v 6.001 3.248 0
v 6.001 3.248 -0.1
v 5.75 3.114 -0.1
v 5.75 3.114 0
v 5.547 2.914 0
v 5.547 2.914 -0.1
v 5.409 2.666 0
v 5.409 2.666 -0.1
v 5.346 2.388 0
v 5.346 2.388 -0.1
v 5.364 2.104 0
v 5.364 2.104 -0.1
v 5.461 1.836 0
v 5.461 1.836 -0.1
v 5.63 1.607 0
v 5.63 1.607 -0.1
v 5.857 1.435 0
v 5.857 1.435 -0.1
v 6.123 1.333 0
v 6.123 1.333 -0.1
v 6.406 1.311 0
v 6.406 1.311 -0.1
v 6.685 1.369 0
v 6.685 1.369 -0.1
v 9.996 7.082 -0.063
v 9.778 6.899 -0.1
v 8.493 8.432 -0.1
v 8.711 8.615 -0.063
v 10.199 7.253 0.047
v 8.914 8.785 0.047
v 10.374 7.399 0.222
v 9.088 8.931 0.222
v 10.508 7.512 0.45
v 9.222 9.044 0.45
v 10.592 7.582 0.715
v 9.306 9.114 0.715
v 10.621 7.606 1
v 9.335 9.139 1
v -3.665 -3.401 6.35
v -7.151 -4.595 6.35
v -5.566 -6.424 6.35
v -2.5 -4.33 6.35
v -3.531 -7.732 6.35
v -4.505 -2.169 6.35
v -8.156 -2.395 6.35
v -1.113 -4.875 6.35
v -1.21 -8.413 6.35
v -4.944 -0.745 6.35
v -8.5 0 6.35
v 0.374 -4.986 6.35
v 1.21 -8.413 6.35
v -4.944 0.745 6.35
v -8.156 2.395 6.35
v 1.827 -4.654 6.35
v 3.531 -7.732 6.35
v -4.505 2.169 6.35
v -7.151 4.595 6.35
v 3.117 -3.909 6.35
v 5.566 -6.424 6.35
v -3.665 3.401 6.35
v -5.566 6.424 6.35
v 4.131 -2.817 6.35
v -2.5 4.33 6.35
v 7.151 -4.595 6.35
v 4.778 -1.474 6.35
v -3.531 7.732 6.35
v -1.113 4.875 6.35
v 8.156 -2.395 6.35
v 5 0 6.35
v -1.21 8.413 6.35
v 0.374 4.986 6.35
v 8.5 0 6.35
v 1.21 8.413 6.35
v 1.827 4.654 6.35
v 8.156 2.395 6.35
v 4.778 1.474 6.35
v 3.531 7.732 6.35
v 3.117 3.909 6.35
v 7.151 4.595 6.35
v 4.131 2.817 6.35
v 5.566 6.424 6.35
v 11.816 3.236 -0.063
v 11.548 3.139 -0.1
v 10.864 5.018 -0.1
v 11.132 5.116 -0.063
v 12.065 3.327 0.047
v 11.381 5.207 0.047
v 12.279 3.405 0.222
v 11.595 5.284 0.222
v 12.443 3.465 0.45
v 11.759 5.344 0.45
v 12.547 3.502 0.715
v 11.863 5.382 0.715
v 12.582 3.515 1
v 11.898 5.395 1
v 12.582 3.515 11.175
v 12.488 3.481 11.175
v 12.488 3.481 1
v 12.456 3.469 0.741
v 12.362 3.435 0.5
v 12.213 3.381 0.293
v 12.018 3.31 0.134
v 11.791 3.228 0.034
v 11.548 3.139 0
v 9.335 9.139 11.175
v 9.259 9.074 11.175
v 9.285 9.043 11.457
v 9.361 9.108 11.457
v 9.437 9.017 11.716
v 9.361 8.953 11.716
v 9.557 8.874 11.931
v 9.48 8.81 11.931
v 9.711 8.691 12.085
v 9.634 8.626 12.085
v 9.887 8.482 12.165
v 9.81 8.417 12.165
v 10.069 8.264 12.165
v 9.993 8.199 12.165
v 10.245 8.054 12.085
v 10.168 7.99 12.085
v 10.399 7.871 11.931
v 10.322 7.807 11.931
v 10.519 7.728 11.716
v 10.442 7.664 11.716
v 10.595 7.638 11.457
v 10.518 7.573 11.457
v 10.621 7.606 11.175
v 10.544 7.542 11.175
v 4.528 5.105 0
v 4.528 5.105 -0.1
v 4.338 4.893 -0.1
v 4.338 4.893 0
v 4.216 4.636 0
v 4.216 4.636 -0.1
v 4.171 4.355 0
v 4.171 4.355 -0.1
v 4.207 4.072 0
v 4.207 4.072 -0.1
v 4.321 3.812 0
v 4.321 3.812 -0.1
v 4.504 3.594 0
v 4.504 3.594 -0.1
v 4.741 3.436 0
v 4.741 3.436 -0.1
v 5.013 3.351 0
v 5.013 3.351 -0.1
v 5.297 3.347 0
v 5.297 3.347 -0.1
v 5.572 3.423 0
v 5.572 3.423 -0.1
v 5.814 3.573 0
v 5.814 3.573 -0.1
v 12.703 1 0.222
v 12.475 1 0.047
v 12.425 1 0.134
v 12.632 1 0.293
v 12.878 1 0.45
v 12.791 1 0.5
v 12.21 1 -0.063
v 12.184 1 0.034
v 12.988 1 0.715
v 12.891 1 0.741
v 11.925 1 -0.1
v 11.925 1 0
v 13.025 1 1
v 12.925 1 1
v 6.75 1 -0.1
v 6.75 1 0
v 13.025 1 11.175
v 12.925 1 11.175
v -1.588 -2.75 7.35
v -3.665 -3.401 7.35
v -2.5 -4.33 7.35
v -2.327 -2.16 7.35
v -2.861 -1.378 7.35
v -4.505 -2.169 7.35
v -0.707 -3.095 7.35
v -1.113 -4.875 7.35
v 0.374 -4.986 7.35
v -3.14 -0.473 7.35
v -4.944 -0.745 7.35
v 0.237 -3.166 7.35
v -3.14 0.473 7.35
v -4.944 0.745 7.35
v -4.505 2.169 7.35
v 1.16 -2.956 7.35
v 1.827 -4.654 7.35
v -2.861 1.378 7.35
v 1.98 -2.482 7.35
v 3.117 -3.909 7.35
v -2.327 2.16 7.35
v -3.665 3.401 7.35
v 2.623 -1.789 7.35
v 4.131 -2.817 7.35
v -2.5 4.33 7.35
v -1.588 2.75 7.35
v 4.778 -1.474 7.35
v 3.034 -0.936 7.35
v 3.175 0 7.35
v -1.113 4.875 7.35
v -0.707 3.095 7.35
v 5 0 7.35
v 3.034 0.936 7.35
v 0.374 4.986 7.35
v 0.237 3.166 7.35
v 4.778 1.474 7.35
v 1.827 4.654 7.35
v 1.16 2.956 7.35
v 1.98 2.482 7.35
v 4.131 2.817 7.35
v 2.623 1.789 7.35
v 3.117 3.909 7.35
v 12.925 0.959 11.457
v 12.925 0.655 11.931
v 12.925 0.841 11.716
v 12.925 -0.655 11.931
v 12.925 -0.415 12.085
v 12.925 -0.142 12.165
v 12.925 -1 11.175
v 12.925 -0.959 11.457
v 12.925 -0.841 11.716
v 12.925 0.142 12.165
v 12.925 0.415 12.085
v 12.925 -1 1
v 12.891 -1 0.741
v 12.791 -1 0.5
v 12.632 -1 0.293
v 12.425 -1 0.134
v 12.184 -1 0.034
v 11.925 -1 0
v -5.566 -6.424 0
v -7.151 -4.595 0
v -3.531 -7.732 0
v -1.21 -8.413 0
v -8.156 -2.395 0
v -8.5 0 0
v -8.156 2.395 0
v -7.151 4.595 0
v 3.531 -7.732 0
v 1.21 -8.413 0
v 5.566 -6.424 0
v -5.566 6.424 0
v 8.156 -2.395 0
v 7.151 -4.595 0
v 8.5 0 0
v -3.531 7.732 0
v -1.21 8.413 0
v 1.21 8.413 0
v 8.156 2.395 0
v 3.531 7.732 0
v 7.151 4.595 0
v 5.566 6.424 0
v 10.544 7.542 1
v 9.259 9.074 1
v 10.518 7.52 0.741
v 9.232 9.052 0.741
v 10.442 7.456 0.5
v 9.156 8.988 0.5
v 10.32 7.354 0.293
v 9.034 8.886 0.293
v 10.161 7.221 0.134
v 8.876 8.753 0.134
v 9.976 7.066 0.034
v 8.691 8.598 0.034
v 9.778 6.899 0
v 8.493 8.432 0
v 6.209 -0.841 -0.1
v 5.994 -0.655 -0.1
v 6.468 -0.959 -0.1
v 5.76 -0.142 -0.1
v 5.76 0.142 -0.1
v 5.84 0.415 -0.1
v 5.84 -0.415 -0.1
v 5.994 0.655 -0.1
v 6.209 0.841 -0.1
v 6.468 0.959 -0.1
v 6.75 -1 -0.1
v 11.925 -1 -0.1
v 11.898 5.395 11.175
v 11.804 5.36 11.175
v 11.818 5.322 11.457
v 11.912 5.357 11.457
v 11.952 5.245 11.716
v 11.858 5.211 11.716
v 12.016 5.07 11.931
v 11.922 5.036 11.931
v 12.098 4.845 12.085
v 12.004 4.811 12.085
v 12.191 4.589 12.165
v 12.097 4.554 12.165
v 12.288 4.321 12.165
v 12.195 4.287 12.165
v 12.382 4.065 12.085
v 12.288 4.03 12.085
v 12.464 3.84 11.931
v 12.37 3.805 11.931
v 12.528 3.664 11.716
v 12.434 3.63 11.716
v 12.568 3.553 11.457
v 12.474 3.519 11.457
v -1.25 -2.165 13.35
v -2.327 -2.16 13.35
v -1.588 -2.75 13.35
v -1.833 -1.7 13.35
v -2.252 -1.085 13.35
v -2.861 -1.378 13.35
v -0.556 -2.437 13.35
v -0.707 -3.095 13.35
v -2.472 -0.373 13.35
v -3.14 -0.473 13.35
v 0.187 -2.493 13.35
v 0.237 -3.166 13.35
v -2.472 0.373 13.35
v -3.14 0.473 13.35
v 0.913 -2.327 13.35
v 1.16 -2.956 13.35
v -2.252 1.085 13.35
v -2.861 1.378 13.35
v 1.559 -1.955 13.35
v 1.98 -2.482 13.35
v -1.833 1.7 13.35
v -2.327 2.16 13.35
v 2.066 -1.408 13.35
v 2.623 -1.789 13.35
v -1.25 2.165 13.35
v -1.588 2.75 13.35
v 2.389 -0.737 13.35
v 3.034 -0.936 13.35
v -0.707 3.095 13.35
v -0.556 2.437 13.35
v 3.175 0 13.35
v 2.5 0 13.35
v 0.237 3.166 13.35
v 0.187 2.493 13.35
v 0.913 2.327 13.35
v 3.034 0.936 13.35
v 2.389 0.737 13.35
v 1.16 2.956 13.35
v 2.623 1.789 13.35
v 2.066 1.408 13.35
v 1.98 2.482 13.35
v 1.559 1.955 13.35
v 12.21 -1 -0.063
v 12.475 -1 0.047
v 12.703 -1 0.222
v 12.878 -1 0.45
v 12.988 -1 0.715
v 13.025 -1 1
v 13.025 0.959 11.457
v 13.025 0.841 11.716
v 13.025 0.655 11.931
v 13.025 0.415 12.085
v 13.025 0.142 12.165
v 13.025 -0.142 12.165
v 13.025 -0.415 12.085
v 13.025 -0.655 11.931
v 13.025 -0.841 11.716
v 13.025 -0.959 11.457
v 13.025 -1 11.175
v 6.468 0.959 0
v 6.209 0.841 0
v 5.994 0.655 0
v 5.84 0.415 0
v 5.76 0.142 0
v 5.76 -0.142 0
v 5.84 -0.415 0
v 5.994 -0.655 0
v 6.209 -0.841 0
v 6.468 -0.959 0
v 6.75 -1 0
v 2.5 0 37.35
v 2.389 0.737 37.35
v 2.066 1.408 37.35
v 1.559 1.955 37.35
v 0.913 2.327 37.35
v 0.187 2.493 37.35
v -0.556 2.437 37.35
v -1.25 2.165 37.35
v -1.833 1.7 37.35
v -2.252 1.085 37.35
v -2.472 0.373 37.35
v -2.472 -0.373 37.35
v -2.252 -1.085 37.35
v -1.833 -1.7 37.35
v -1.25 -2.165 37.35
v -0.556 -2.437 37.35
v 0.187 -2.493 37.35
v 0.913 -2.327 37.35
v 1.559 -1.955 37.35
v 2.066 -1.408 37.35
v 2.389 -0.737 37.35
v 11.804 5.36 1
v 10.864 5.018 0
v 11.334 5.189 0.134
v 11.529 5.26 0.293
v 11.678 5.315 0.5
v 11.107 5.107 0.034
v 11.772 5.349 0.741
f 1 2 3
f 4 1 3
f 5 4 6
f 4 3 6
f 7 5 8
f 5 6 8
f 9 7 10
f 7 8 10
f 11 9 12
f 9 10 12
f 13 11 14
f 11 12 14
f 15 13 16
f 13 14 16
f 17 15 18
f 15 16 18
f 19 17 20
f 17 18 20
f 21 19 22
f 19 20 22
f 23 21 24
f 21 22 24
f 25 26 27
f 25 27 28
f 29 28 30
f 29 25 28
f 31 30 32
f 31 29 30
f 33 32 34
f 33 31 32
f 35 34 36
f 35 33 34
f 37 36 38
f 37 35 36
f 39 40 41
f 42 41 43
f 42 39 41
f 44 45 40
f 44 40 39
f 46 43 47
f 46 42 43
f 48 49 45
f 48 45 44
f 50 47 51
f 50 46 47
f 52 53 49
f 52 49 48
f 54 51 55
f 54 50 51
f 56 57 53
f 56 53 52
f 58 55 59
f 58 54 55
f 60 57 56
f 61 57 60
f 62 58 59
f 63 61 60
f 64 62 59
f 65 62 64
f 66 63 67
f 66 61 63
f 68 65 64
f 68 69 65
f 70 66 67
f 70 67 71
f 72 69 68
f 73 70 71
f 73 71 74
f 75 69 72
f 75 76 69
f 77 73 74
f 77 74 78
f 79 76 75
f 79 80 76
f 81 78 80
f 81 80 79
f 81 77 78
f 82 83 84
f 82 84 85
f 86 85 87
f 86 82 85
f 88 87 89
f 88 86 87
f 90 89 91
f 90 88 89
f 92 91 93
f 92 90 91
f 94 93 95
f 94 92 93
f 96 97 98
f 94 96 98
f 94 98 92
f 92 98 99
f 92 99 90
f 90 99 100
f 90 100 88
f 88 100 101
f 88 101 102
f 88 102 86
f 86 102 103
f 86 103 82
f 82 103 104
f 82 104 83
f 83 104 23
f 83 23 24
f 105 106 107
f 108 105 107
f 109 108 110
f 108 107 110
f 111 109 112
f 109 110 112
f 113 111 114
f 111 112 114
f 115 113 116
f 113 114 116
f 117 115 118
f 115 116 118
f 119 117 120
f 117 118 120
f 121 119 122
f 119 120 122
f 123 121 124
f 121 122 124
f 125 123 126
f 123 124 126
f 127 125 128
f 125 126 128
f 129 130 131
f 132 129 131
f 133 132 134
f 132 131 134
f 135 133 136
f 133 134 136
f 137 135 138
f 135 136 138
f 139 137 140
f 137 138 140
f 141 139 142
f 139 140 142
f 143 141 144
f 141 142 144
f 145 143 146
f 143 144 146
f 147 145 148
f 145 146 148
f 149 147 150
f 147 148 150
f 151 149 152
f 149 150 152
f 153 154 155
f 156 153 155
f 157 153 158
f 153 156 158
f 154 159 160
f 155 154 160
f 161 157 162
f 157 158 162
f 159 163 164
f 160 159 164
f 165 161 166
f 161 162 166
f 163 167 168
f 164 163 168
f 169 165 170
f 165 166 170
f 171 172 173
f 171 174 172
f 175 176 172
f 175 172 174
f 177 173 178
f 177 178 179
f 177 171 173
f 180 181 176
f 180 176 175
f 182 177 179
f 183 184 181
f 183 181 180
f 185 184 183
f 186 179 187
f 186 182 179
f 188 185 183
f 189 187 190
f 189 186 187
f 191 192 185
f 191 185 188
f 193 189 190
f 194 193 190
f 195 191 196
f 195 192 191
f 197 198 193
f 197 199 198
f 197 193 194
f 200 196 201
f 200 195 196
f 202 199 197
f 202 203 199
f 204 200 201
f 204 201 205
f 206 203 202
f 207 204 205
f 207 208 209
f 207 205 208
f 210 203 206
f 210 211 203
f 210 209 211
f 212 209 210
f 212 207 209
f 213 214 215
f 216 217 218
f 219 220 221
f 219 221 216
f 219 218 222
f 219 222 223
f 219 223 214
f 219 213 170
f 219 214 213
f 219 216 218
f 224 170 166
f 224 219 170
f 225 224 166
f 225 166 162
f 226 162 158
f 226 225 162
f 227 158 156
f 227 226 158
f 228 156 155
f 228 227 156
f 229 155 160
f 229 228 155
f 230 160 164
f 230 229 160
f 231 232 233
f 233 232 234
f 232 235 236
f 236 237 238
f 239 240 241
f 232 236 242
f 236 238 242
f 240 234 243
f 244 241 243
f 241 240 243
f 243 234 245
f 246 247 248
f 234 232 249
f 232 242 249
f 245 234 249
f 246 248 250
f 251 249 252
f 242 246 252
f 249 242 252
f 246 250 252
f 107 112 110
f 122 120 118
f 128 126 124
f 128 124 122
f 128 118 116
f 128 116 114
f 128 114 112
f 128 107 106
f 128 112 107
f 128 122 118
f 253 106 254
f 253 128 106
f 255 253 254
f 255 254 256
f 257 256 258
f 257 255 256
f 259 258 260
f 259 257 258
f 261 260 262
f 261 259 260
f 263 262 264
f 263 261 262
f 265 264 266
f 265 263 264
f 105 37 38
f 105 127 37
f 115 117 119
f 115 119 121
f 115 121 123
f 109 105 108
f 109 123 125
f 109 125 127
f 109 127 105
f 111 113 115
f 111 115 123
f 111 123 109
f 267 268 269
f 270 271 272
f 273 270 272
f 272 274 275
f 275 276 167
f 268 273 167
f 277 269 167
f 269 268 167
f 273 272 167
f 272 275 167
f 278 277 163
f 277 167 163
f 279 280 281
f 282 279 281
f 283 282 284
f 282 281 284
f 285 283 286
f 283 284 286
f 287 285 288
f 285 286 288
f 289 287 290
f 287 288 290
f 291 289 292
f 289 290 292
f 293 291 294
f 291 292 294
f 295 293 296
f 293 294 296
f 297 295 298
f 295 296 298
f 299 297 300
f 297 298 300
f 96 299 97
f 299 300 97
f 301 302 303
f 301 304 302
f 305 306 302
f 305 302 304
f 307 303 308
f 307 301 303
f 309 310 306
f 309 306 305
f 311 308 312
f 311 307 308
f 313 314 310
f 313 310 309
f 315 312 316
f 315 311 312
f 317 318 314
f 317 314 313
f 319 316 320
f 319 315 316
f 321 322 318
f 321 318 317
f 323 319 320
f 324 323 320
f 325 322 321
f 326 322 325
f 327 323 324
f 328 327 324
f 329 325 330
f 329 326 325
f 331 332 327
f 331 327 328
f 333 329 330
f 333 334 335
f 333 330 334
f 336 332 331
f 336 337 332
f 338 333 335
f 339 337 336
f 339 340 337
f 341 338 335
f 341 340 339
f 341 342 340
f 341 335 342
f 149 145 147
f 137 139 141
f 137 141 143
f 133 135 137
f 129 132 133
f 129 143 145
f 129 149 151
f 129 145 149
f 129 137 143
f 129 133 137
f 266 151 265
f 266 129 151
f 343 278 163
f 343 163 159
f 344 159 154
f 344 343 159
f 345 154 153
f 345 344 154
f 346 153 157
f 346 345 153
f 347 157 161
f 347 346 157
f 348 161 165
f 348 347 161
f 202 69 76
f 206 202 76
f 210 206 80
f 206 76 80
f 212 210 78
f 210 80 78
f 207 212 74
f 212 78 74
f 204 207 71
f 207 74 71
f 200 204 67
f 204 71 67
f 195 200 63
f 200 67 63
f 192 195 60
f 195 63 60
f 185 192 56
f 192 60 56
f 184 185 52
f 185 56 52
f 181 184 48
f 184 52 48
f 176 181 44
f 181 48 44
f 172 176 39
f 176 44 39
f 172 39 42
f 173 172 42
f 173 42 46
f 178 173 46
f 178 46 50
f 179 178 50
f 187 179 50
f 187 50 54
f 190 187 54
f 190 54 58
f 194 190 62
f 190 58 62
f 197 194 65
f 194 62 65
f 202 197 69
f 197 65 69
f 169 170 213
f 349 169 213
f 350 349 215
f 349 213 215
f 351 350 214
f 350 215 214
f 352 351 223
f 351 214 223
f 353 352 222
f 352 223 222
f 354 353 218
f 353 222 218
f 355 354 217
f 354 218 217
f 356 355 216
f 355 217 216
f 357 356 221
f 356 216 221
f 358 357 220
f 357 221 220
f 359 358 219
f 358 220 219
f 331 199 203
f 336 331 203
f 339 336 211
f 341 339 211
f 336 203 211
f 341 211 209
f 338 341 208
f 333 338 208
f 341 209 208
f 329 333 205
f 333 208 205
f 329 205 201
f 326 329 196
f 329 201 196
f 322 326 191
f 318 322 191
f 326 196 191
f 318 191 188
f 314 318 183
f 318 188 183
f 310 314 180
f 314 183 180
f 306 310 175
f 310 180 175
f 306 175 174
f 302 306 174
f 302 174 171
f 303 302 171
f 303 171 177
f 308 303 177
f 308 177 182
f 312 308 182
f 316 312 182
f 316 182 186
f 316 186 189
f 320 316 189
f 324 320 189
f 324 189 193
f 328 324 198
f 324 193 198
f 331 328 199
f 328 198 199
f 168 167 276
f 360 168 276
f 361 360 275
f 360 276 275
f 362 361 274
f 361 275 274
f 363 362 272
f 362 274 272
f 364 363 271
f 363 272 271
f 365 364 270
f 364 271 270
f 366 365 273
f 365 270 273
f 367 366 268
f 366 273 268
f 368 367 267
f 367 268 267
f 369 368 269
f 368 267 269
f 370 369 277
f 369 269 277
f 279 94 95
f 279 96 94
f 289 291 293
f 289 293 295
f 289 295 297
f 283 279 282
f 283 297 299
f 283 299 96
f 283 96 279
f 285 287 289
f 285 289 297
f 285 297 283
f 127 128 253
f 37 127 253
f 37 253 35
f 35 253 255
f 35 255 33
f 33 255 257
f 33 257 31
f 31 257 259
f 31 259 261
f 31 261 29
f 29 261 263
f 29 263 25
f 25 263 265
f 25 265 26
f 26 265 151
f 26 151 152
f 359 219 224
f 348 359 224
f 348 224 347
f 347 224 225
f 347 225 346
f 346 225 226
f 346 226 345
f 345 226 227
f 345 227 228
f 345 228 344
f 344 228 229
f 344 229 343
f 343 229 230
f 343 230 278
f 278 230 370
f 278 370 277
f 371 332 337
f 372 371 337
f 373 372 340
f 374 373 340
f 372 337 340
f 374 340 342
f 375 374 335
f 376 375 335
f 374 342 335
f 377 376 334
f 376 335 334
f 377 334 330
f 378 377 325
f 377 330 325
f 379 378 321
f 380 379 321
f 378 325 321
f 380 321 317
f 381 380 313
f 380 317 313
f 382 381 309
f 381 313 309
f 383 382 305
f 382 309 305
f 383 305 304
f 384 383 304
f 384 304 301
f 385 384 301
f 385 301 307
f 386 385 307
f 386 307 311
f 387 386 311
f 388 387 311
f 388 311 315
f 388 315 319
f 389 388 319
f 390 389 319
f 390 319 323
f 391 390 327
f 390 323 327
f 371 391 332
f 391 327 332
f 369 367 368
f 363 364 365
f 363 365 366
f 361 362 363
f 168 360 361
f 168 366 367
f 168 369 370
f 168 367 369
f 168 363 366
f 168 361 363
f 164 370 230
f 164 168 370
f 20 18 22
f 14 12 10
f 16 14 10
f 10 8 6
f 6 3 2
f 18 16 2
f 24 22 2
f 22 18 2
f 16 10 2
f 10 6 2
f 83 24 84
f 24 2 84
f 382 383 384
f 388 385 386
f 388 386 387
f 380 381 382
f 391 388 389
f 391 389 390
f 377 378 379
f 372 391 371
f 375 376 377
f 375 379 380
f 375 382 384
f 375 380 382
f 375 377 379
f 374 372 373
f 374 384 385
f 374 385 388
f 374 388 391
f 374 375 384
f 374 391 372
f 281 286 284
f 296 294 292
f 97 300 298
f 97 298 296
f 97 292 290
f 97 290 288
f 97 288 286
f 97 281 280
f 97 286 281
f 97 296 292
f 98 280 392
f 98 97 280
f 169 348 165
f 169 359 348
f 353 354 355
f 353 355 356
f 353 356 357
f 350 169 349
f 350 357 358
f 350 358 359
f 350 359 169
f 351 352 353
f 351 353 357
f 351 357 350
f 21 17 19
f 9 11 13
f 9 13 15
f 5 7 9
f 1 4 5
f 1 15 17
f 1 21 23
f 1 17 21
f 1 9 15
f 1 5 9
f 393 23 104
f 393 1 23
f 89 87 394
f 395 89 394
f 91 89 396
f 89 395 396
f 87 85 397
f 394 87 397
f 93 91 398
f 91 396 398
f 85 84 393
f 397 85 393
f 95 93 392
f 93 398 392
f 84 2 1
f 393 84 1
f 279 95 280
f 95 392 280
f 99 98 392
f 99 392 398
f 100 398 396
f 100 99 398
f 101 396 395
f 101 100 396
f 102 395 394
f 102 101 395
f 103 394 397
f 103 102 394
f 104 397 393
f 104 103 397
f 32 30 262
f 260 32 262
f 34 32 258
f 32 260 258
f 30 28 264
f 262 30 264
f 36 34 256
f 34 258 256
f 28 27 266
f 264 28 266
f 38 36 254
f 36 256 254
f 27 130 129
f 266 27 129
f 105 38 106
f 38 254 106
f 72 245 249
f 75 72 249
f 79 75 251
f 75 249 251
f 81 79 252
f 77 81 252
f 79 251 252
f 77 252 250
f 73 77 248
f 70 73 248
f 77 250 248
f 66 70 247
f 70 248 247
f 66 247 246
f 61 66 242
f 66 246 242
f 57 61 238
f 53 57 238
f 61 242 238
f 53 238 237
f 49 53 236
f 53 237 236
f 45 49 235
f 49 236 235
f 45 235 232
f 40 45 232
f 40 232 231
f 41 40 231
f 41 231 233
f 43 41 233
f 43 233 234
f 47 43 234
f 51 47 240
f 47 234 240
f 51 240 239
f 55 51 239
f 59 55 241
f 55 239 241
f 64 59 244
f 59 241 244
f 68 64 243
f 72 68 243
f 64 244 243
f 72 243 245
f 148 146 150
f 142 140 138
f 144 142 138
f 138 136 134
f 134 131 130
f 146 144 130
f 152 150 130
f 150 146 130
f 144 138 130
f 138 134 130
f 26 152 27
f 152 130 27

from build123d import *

# Parameters (mm, degrees)
SKETCH1_R                = 8.5
BOSS_EXTRUDE1_DEPTH      = 6.35
SKETCH2_R                = 5
BOSS_EXTRUDE2_DEPTH      = 1
SKETCH3_R                = 3.175
BOSS_EXTRUDE3_DEPTH      = 6
SKETCH4_R                = 2.5
BOSS_EXTRUDE4_DEPTH      = 24
BASE_FLANGE1_START       = -0.1
BASE_FLANGE1_DEPTH       = 0.1
SKETCHED_START           = 12.925331928
SKETCHED_BEND6_OUTLINE_W = 2
SKETCHED_BEND6_OUTLINE_H = 0.1
SKETCHED_BEND6_DEPTH     = 13.074668072
SKETCHED_START_2         = 11.925331928
SKETCHED_BEND6_2_DEPTH   = 1.1
SKETCHED_START_3         = -1
SKETCHED_BEND6_3_DEPTH   = 2
CIRPATTERN1_COUNT        = 3
CIRPATTERN1_ANGLE        = 40


with BuildPart() as part:
    # Sketch1 → Boss-Extrude1 (new body)
    with BuildSketch(Plane.XY):
        Circle(SKETCH1_R)
    extrude(amount=BOSS_EXTRUDE1_DEPTH)

    # Sketch2 → Boss-Extrude2 (add)
    with BuildSketch(Plane.XY.offset(6.35)):
        Circle(SKETCH2_R)
    extrude(amount=BOSS_EXTRUDE2_DEPTH)

    # Sketch3 → Boss-Extrude3 (add)
    with BuildSketch(Plane.XY.offset(7.35)):
        Circle(SKETCH3_R)
    extrude(amount=BOSS_EXTRUDE3_DEPTH)

    # Sketch4 → Boss-Extrude4 (add)
    with BuildSketch(Plane.XY.offset(13.35)):
        Circle(SKETCH4_R)
    extrude(amount=BOSS_EXTRUDE4_DEPTH)


with BuildPart() as body_2:
    # Base-Flange1: read off the stored shape, not the designer's step
    # Base-Flange1 outline → Base-Flange1 (new body)
    with BuildSketch(Plane.XY.offset(BASE_FLANGE1_START)):
        with BuildLine():
            Line((23.75, 1), (6.75, 1))
            ThreePointArc((6.75, 1), (5.75, 0), (6.75, -1))
            Line((6.75, -1), (23.75, -1))
            ThreePointArc((23.75, -1), (24.75, 0), (23.75, 1))
        make_face()
    extrude(amount=BASE_FLANGE1_DEPTH)

    # Sketched Bend6: read off the stored shape, not the designer's step
    # Sketched Bend6 outline → Sketched Bend6 (cut)
    with BuildSketch(Plane.YZ.offset(SKETCHED_START)):
        with Locations((0, -0.05)):
            Rectangle(SKETCHED_BEND6_OUTLINE_W, SKETCHED_BEND6_OUTLINE_H)
    extrude(amount=SKETCHED_BEND6_DEPTH, mode=Mode.SUBTRACT)

    # Sketched Bend6 2 outline → Sketched Bend6 2 (add)
    with BuildSketch(Plane.YZ.offset(SKETCHED_START_2)):
        with BuildLine():
            Line((1, 0), (1, 11.175331928))
            ThreePointArc((1, 11.175331928), (0, 12.175331928), (-1, 11.175331928))
            Line((-1, 11.175331928), (-1, 0))
            Line((-1, 0), (1, 0))
        make_face()
    extrude(amount=SKETCHED_BEND6_2_DEPTH)

    # Sketched Bend6 3 outline → Sketched Bend6 3 (cut)
    with BuildSketch(Plane(origin=(0, 0, 0), x_dir=(1, 0, 0), z_dir=(0, 1, 0)).offset(SKETCHED_START_3)):
        with BuildLine():
            Line((12.925331928, -14), (12.925331928, -1))
            ThreePointArc((12.925331928, -1), (12.63243871, -0.292893218), (11.925331928, 0))
            Line((11.925331928, 0), (11.925331928, -14))
            Line((11.925331928, -14), (12.925331928, -14))
        make_face()
        with BuildLine():
            Line((13.025331928, -1), (13.02533192, -14))
            Line((13.02533192, -14), (15, -14))
            Line((15, -14), (15, 0))
            Line((15, 0), (12.925331928, 0))
            Line((12.925331928, 0), (12.925331928, 0.1))
            Line((12.925331928, 0.1), (11.925331928, 0.1))
            ThreePointArc((11.925331928, 0.1), (12.703149387, -0.222182541), (13.025331928, -1))
        make_face()
    extrude(amount=SKETCHED_BEND6_3_DEPTH, mode=Mode.SUBTRACT)


with BuildPart() as cirpattern1_1:
    # CirPattern1: pattern copy
    add(body_2.part.rotate(Axis((0, 0, 0), (0, 0, 1)), 1 * CIRPATTERN1_ANGLE / (CIRPATTERN1_COUNT - 1)))


with BuildPart() as cirpattern1_2:
    # CirPattern1: pattern copy
    add(body_2.part.rotate(Axis((0, 0, 0), (0, 0, 1)), 2 * CIRPATTERN1_ANGLE / (CIRPATTERN1_COUNT - 1)))


solid = Compound([part.part, body_2.part, cirpattern1_1.part, cirpattern1_2.part])
